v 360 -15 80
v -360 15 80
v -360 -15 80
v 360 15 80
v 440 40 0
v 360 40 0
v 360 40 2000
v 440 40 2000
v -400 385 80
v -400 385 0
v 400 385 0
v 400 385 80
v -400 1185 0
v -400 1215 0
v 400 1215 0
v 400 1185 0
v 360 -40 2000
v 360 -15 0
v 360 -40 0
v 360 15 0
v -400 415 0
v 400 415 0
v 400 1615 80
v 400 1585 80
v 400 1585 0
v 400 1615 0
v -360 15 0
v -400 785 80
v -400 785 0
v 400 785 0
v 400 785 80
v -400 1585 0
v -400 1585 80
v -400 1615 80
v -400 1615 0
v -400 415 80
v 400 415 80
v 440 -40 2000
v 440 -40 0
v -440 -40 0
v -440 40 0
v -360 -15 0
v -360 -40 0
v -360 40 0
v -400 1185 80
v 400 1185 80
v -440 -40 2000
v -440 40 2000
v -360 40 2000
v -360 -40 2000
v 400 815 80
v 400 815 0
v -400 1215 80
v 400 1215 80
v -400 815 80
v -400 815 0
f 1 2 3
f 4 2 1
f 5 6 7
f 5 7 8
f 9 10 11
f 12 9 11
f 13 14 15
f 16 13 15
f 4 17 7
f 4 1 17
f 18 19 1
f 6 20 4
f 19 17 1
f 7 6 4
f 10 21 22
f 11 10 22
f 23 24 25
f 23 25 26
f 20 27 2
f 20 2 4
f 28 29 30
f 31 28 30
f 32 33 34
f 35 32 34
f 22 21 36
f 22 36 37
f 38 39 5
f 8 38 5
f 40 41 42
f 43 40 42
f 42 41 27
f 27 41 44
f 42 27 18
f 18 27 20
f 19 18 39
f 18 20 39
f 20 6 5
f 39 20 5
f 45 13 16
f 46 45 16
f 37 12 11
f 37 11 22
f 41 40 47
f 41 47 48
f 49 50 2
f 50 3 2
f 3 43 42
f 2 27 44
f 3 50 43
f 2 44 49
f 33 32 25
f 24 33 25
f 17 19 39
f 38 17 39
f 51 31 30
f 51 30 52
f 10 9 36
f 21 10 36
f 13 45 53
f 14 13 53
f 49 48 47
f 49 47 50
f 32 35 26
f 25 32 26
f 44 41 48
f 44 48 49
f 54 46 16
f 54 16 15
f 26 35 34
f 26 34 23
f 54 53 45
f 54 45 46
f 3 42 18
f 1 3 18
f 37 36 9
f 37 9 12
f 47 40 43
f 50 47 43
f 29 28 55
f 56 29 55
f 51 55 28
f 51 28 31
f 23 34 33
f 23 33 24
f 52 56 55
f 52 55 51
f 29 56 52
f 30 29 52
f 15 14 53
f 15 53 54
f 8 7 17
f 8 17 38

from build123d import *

# Parameters (mm, degrees)
SKETCH_1_W      = 80
SKETCH_1_H      = 80
EXTRUDE_1_DEPTH = 2000
SKETCH_2_W      = 80
SKETCH_2_H      = 80
EXTRUDE_2_DEPTH = 2000
SKETCH_3_W      = 800
SKETCH_3_H      = 30
EXTRUDE_3_DEPTH = 80
SKETCH_4_W      = 800
SKETCH_4_H      = 30
EXTRUDE_4_DEPTH = 80
SKETCH_5_W      = 800
SKETCH_5_H      = 30
EXTRUDE_5_DEPTH = 80
SKETCH_6_W      = 800
SKETCH_6_H      = 30
EXTRUDE_6_DEPTH = 80
SKETCH_7_W      = 800
SKETCH_7_H      = 30
EXTRUDE_7_DEPTH = 80


with BuildPart() as part:
    # 草图1 → 凸台-拉伸1 (new body)
    with BuildSketch(Plane.XY):
        with Locations((-400, 0)):
            Rectangle(SKETCH_1_W, SKETCH_1_H)
    extrude(amount=EXTRUDE_1_DEPTH)



with BuildPart() as body_2:
    # 草图2 → 凸台-拉伸2 (new body)
    with BuildSketch(Plane.XY):
        with Locations((400, 0)):
            Rectangle(SKETCH_2_W, SKETCH_2_H)
    extrude(amount=EXTRUDE_2_DEPTH)


with BuildPart() as part_1:
    add(part.part)

    add(body_2.part)  # 凸台-拉伸3 merges body 2
    # 草图3 → 凸台-拉伸3 (add)
    with BuildSketch(Plane.XY):
        Rectangle(SKETCH_3_W, SKETCH_3_H)
    extrude(amount=EXTRUDE_3_DEPTH)


with BuildPart() as body_2_2:
    # 草图4 → 凸台-拉伸4 (new body)
    with BuildSketch(Plane.XY):
        with Locations((0, 400)):
            Rectangle(SKETCH_4_W, SKETCH_4_H)
    extrude(amount=EXTRUDE_4_DEPTH)


with BuildPart() as body_3:
    # 草图5 → 凸台-拉伸5 (new body)
    with BuildSketch(Plane.XY):
        with Locations((0, 800)):
            Rectangle(SKETCH_5_W, SKETCH_5_H)
    extrude(amount=EXTRUDE_5_DEPTH)


with BuildPart() as body_4:
    # 草图6 → 凸台-拉伸6 (new body)
    with BuildSketch(Plane.XY):
        with Locations((0, 1200)):
            Rectangle(SKETCH_6_W, SKETCH_6_H)
    extrude(amount=EXTRUDE_6_DEPTH)


with BuildPart() as body_5:
    # 草图7 → 凸台-拉伸7 (new body)
    with BuildSketch(Plane.XY):
        with Locations((0, 1600)):
            Rectangle(SKETCH_7_W, SKETCH_7_H)
    extrude(amount=EXTRUDE_7_DEPTH)


solid = Compound([part_1.part, body_2_2.part, body_3.part, body_4.part, body_5.part])
